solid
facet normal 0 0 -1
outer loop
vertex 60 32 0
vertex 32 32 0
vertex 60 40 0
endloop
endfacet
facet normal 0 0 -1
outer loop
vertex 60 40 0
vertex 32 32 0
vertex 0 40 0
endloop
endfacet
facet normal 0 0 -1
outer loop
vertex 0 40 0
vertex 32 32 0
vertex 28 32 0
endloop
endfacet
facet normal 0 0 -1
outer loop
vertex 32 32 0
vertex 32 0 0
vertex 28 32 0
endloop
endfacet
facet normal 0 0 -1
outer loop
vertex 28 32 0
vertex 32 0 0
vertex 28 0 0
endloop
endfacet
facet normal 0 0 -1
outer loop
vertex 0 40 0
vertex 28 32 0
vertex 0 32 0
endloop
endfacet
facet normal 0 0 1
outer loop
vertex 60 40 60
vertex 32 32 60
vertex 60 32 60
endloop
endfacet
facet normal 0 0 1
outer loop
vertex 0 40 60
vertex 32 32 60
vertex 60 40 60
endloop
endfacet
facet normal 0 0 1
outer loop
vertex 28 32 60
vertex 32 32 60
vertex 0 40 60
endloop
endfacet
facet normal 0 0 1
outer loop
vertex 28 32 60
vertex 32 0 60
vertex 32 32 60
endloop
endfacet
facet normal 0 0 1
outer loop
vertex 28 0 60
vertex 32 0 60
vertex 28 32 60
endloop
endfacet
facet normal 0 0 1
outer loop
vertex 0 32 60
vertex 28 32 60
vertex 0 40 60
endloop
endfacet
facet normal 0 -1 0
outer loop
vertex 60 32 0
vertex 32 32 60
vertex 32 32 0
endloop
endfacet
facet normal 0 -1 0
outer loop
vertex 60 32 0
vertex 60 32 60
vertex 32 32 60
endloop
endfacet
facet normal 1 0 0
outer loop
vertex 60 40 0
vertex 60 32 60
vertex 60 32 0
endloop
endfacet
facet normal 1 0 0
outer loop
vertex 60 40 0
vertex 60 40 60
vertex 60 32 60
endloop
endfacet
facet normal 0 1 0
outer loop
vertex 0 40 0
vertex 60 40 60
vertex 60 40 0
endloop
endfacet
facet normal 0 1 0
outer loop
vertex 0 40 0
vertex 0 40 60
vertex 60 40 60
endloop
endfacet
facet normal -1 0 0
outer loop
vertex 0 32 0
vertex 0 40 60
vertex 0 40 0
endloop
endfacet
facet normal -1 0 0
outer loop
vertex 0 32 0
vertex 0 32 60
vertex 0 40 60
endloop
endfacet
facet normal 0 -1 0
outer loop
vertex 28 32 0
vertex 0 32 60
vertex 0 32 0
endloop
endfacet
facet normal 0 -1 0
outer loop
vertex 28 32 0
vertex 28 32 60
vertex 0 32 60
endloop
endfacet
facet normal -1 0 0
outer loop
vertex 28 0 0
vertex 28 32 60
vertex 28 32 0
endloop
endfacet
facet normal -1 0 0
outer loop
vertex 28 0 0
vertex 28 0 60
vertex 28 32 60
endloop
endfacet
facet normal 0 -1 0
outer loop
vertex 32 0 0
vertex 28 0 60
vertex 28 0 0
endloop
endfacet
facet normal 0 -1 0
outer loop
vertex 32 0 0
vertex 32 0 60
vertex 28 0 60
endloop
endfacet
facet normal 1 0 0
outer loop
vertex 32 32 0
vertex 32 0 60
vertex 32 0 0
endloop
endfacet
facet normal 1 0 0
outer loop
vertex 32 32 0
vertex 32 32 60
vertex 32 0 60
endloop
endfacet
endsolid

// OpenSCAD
$fn = 32;

// ----------------------------------------------------------------------
// Structural section: tee 60 x 40 mm
// ----------------------------------------------------------------------

// --- parameters (mm) ---
sec_w = 60;               // tee width, X
sec_h = 40;               // tee height, Y
flange_t = 8;             // top flange thickness
web_t = 4;                // web thickness
plate_t = 60;             // cut length, Z (extrusion height)

profile = [[28, 0], [32, 0], [32, 32], [60, 32], [60, 40], [0, 40], [0, 32], [28, 32]];  // primary outline, 8 points, counter clockwise

// --- the one profile operation ---
linear_extrude(height = plate_t) polygon(points = profile);
